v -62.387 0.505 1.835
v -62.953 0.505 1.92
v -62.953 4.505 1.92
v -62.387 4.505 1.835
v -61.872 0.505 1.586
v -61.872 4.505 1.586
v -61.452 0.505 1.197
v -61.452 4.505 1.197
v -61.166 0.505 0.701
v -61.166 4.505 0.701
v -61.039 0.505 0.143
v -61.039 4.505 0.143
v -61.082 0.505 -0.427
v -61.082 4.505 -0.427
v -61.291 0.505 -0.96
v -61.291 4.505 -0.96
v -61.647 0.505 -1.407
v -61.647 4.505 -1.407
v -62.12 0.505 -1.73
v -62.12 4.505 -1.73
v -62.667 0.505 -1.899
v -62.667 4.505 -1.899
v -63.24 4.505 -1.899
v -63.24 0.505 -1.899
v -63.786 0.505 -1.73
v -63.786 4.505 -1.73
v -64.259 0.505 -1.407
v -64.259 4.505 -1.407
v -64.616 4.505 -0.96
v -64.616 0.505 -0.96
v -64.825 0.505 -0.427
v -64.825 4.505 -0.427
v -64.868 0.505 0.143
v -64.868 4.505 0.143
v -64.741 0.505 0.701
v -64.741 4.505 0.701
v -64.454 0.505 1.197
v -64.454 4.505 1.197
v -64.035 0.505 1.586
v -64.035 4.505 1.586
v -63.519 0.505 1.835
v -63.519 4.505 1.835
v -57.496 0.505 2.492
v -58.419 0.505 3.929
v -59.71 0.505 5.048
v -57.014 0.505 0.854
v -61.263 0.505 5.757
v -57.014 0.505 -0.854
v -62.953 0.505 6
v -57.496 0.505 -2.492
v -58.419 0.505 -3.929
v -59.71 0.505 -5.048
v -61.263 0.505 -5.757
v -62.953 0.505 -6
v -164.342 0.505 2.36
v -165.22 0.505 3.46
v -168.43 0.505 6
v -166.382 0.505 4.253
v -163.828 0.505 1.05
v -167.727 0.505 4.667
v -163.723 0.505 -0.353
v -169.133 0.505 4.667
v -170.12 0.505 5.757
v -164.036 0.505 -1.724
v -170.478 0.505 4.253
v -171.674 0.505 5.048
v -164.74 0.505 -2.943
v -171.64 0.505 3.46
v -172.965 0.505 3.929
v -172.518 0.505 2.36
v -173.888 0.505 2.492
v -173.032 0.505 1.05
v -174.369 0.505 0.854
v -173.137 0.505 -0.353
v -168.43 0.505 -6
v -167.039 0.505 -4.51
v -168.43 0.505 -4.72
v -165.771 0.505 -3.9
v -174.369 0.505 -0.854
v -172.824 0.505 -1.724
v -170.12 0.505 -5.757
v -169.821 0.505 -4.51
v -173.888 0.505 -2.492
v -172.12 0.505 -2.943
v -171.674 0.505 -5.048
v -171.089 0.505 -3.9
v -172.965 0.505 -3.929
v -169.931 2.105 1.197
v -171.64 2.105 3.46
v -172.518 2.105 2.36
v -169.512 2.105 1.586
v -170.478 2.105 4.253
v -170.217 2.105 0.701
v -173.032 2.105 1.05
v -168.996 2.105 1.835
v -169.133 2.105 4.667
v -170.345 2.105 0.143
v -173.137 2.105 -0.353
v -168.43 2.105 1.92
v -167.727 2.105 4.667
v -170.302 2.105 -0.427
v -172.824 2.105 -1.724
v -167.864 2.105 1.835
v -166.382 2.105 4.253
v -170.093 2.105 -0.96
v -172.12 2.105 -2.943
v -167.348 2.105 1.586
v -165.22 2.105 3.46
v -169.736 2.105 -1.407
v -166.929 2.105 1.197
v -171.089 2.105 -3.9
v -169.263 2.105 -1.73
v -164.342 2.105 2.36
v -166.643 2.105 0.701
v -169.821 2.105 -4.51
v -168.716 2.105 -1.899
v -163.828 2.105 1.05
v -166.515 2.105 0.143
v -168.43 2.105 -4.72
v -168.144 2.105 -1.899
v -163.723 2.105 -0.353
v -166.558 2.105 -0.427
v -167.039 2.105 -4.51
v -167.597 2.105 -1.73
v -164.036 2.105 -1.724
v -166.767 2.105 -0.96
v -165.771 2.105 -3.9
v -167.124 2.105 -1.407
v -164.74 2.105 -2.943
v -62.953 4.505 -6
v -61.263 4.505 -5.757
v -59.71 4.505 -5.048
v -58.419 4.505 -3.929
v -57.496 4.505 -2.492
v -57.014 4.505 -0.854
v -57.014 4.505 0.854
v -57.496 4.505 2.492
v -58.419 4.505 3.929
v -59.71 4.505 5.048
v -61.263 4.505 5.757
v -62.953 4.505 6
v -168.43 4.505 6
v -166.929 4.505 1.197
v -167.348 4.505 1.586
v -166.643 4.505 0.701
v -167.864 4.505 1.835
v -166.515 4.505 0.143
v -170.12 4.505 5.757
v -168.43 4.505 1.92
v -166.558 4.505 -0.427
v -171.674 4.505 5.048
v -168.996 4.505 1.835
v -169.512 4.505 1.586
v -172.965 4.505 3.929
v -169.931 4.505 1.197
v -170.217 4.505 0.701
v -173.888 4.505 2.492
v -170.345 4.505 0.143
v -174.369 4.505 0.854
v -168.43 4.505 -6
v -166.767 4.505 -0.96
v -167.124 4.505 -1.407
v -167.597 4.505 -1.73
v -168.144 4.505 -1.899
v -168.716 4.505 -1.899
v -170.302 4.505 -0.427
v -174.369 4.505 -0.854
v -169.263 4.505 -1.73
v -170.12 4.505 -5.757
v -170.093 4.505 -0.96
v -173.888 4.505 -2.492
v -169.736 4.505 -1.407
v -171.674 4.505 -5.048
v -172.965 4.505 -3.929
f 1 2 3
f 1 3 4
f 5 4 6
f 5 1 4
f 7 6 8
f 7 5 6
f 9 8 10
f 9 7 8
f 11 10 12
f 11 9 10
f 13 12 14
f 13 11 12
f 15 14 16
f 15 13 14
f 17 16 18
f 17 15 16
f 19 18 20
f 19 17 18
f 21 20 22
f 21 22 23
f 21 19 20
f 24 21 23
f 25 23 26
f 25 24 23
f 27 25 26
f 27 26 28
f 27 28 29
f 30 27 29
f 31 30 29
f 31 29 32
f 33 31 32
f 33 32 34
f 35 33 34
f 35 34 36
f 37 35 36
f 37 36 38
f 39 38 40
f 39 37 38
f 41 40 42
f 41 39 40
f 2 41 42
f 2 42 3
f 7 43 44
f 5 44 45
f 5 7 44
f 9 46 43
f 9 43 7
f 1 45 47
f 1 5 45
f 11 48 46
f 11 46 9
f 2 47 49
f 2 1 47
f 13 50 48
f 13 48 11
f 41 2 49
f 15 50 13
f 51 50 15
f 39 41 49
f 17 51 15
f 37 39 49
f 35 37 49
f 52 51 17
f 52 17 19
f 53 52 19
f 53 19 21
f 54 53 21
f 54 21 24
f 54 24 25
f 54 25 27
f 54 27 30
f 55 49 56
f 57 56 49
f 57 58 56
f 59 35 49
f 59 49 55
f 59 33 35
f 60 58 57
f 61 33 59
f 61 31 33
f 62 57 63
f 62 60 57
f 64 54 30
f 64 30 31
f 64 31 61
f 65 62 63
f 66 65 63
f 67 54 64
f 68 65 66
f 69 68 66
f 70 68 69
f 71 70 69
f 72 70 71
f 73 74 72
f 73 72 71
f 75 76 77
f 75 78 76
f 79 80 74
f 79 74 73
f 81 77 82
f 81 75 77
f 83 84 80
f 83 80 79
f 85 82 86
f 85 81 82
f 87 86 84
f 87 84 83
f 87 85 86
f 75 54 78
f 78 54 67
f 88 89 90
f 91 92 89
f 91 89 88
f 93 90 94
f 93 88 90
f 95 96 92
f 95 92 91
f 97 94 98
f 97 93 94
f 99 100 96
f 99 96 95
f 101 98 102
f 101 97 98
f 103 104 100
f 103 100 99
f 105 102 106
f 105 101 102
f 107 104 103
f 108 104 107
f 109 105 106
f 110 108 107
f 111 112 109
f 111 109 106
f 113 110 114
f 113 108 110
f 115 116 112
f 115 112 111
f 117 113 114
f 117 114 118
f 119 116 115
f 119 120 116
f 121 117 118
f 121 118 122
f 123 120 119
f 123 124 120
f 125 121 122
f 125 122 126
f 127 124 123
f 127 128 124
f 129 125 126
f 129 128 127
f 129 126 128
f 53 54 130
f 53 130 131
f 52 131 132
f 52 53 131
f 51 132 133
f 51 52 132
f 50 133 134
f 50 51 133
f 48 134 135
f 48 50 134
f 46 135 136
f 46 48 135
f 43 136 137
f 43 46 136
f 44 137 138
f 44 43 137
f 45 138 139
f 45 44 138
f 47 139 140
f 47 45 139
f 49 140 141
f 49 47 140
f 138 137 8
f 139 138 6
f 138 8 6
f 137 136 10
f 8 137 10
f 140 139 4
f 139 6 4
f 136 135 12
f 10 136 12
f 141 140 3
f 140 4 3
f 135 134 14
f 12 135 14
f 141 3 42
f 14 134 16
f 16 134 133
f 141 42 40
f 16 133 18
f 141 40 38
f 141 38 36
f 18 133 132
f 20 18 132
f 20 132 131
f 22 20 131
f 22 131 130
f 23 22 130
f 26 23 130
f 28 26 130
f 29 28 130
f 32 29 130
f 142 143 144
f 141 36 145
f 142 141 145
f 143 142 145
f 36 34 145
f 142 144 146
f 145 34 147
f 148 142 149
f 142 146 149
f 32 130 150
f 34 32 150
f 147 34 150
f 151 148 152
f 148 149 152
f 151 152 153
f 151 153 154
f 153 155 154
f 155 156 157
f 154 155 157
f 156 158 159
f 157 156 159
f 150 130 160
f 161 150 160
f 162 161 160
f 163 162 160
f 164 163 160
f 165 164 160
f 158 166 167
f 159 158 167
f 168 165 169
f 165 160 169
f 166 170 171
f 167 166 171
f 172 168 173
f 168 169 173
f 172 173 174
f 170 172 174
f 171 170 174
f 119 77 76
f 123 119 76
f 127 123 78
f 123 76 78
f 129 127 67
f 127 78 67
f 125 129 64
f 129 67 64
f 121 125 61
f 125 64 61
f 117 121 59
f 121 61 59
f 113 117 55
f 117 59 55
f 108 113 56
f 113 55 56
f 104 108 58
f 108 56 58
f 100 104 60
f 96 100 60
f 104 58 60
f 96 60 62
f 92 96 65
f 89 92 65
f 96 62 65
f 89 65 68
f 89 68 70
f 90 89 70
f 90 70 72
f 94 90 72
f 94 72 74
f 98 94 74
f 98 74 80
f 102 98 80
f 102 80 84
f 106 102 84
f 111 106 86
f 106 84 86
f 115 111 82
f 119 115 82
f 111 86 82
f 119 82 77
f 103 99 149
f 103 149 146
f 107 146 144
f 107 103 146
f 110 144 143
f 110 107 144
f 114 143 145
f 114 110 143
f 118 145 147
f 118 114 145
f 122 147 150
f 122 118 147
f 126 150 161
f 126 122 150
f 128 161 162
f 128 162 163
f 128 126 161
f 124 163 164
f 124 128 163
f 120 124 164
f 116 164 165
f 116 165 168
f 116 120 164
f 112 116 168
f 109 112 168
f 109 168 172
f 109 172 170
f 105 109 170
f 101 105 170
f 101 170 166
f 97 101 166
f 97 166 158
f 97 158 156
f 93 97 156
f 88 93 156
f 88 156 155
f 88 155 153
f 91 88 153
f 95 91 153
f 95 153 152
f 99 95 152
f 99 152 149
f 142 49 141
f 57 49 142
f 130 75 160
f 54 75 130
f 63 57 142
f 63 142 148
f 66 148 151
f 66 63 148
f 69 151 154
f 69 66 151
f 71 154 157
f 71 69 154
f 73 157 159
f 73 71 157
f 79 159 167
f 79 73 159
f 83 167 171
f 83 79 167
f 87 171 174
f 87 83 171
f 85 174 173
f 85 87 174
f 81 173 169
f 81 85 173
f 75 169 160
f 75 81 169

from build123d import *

# Parameters (mm, degrees)
SKETCH1_R           = 2.4
BOSS_EXTRUDE1_DEPTH = 5
SKETCH2_R           = 5.9
CUT_EXTRUDE1_DEPTH  = 2
SCALE1_SCALE        = 0.8


with BuildPart() as part:
    # Sketch1 → Boss-Extrude1 (new body)
    with BuildSketch(Plane(origin=(0, 0, 0), x_dir=(1, 0, 0), z_dir=(0, 1, 0))):
        with BuildLine():
            Line((-181.84579044, 7.5), (-50, 7.5))
            ThreePointArc((-50, 7.5), (-42.5, 0), (-50, -7.5))
            Line((-50, -7.5), (-181.84579044, -7.5))
            ThreePointArc((-181.84579044, -7.5), (-189.34579044, 0), (-181.84579044, 7.5))
        make_face()
        with Locations(Location((-181.84579044, 0, 0), (0, 0, 270))):
            Circle(SKETCH1_R, mode=Mode.SUBTRACT)
        with Locations(Location((-50, 0, 0), (0, 0, 270))):
            Circle(SKETCH1_R, mode=Mode.SUBTRACT)
    extrude(amount=BOSS_EXTRUDE1_DEPTH)

    # Sketch2 → Cut-Extrude1 (cut)
    with BuildSketch(Plane.XZ):
        with Locations(Location((-181.84579044, 0, 0), (0, 0, 270))):
            Circle(SKETCH2_R)
    extrude(amount=-CUT_EXTRUDE1_DEPTH, mode=Mode.SUBTRACT)


with BuildPart() as part_1:
    # Scale1: scaled about (-114.766854611, 2.52630438, 0)
    add(part.part.scale(SCALE1_SCALE).moved(Location((-22.953370922, 0.505260876, 0))))


solid = part_1.part
